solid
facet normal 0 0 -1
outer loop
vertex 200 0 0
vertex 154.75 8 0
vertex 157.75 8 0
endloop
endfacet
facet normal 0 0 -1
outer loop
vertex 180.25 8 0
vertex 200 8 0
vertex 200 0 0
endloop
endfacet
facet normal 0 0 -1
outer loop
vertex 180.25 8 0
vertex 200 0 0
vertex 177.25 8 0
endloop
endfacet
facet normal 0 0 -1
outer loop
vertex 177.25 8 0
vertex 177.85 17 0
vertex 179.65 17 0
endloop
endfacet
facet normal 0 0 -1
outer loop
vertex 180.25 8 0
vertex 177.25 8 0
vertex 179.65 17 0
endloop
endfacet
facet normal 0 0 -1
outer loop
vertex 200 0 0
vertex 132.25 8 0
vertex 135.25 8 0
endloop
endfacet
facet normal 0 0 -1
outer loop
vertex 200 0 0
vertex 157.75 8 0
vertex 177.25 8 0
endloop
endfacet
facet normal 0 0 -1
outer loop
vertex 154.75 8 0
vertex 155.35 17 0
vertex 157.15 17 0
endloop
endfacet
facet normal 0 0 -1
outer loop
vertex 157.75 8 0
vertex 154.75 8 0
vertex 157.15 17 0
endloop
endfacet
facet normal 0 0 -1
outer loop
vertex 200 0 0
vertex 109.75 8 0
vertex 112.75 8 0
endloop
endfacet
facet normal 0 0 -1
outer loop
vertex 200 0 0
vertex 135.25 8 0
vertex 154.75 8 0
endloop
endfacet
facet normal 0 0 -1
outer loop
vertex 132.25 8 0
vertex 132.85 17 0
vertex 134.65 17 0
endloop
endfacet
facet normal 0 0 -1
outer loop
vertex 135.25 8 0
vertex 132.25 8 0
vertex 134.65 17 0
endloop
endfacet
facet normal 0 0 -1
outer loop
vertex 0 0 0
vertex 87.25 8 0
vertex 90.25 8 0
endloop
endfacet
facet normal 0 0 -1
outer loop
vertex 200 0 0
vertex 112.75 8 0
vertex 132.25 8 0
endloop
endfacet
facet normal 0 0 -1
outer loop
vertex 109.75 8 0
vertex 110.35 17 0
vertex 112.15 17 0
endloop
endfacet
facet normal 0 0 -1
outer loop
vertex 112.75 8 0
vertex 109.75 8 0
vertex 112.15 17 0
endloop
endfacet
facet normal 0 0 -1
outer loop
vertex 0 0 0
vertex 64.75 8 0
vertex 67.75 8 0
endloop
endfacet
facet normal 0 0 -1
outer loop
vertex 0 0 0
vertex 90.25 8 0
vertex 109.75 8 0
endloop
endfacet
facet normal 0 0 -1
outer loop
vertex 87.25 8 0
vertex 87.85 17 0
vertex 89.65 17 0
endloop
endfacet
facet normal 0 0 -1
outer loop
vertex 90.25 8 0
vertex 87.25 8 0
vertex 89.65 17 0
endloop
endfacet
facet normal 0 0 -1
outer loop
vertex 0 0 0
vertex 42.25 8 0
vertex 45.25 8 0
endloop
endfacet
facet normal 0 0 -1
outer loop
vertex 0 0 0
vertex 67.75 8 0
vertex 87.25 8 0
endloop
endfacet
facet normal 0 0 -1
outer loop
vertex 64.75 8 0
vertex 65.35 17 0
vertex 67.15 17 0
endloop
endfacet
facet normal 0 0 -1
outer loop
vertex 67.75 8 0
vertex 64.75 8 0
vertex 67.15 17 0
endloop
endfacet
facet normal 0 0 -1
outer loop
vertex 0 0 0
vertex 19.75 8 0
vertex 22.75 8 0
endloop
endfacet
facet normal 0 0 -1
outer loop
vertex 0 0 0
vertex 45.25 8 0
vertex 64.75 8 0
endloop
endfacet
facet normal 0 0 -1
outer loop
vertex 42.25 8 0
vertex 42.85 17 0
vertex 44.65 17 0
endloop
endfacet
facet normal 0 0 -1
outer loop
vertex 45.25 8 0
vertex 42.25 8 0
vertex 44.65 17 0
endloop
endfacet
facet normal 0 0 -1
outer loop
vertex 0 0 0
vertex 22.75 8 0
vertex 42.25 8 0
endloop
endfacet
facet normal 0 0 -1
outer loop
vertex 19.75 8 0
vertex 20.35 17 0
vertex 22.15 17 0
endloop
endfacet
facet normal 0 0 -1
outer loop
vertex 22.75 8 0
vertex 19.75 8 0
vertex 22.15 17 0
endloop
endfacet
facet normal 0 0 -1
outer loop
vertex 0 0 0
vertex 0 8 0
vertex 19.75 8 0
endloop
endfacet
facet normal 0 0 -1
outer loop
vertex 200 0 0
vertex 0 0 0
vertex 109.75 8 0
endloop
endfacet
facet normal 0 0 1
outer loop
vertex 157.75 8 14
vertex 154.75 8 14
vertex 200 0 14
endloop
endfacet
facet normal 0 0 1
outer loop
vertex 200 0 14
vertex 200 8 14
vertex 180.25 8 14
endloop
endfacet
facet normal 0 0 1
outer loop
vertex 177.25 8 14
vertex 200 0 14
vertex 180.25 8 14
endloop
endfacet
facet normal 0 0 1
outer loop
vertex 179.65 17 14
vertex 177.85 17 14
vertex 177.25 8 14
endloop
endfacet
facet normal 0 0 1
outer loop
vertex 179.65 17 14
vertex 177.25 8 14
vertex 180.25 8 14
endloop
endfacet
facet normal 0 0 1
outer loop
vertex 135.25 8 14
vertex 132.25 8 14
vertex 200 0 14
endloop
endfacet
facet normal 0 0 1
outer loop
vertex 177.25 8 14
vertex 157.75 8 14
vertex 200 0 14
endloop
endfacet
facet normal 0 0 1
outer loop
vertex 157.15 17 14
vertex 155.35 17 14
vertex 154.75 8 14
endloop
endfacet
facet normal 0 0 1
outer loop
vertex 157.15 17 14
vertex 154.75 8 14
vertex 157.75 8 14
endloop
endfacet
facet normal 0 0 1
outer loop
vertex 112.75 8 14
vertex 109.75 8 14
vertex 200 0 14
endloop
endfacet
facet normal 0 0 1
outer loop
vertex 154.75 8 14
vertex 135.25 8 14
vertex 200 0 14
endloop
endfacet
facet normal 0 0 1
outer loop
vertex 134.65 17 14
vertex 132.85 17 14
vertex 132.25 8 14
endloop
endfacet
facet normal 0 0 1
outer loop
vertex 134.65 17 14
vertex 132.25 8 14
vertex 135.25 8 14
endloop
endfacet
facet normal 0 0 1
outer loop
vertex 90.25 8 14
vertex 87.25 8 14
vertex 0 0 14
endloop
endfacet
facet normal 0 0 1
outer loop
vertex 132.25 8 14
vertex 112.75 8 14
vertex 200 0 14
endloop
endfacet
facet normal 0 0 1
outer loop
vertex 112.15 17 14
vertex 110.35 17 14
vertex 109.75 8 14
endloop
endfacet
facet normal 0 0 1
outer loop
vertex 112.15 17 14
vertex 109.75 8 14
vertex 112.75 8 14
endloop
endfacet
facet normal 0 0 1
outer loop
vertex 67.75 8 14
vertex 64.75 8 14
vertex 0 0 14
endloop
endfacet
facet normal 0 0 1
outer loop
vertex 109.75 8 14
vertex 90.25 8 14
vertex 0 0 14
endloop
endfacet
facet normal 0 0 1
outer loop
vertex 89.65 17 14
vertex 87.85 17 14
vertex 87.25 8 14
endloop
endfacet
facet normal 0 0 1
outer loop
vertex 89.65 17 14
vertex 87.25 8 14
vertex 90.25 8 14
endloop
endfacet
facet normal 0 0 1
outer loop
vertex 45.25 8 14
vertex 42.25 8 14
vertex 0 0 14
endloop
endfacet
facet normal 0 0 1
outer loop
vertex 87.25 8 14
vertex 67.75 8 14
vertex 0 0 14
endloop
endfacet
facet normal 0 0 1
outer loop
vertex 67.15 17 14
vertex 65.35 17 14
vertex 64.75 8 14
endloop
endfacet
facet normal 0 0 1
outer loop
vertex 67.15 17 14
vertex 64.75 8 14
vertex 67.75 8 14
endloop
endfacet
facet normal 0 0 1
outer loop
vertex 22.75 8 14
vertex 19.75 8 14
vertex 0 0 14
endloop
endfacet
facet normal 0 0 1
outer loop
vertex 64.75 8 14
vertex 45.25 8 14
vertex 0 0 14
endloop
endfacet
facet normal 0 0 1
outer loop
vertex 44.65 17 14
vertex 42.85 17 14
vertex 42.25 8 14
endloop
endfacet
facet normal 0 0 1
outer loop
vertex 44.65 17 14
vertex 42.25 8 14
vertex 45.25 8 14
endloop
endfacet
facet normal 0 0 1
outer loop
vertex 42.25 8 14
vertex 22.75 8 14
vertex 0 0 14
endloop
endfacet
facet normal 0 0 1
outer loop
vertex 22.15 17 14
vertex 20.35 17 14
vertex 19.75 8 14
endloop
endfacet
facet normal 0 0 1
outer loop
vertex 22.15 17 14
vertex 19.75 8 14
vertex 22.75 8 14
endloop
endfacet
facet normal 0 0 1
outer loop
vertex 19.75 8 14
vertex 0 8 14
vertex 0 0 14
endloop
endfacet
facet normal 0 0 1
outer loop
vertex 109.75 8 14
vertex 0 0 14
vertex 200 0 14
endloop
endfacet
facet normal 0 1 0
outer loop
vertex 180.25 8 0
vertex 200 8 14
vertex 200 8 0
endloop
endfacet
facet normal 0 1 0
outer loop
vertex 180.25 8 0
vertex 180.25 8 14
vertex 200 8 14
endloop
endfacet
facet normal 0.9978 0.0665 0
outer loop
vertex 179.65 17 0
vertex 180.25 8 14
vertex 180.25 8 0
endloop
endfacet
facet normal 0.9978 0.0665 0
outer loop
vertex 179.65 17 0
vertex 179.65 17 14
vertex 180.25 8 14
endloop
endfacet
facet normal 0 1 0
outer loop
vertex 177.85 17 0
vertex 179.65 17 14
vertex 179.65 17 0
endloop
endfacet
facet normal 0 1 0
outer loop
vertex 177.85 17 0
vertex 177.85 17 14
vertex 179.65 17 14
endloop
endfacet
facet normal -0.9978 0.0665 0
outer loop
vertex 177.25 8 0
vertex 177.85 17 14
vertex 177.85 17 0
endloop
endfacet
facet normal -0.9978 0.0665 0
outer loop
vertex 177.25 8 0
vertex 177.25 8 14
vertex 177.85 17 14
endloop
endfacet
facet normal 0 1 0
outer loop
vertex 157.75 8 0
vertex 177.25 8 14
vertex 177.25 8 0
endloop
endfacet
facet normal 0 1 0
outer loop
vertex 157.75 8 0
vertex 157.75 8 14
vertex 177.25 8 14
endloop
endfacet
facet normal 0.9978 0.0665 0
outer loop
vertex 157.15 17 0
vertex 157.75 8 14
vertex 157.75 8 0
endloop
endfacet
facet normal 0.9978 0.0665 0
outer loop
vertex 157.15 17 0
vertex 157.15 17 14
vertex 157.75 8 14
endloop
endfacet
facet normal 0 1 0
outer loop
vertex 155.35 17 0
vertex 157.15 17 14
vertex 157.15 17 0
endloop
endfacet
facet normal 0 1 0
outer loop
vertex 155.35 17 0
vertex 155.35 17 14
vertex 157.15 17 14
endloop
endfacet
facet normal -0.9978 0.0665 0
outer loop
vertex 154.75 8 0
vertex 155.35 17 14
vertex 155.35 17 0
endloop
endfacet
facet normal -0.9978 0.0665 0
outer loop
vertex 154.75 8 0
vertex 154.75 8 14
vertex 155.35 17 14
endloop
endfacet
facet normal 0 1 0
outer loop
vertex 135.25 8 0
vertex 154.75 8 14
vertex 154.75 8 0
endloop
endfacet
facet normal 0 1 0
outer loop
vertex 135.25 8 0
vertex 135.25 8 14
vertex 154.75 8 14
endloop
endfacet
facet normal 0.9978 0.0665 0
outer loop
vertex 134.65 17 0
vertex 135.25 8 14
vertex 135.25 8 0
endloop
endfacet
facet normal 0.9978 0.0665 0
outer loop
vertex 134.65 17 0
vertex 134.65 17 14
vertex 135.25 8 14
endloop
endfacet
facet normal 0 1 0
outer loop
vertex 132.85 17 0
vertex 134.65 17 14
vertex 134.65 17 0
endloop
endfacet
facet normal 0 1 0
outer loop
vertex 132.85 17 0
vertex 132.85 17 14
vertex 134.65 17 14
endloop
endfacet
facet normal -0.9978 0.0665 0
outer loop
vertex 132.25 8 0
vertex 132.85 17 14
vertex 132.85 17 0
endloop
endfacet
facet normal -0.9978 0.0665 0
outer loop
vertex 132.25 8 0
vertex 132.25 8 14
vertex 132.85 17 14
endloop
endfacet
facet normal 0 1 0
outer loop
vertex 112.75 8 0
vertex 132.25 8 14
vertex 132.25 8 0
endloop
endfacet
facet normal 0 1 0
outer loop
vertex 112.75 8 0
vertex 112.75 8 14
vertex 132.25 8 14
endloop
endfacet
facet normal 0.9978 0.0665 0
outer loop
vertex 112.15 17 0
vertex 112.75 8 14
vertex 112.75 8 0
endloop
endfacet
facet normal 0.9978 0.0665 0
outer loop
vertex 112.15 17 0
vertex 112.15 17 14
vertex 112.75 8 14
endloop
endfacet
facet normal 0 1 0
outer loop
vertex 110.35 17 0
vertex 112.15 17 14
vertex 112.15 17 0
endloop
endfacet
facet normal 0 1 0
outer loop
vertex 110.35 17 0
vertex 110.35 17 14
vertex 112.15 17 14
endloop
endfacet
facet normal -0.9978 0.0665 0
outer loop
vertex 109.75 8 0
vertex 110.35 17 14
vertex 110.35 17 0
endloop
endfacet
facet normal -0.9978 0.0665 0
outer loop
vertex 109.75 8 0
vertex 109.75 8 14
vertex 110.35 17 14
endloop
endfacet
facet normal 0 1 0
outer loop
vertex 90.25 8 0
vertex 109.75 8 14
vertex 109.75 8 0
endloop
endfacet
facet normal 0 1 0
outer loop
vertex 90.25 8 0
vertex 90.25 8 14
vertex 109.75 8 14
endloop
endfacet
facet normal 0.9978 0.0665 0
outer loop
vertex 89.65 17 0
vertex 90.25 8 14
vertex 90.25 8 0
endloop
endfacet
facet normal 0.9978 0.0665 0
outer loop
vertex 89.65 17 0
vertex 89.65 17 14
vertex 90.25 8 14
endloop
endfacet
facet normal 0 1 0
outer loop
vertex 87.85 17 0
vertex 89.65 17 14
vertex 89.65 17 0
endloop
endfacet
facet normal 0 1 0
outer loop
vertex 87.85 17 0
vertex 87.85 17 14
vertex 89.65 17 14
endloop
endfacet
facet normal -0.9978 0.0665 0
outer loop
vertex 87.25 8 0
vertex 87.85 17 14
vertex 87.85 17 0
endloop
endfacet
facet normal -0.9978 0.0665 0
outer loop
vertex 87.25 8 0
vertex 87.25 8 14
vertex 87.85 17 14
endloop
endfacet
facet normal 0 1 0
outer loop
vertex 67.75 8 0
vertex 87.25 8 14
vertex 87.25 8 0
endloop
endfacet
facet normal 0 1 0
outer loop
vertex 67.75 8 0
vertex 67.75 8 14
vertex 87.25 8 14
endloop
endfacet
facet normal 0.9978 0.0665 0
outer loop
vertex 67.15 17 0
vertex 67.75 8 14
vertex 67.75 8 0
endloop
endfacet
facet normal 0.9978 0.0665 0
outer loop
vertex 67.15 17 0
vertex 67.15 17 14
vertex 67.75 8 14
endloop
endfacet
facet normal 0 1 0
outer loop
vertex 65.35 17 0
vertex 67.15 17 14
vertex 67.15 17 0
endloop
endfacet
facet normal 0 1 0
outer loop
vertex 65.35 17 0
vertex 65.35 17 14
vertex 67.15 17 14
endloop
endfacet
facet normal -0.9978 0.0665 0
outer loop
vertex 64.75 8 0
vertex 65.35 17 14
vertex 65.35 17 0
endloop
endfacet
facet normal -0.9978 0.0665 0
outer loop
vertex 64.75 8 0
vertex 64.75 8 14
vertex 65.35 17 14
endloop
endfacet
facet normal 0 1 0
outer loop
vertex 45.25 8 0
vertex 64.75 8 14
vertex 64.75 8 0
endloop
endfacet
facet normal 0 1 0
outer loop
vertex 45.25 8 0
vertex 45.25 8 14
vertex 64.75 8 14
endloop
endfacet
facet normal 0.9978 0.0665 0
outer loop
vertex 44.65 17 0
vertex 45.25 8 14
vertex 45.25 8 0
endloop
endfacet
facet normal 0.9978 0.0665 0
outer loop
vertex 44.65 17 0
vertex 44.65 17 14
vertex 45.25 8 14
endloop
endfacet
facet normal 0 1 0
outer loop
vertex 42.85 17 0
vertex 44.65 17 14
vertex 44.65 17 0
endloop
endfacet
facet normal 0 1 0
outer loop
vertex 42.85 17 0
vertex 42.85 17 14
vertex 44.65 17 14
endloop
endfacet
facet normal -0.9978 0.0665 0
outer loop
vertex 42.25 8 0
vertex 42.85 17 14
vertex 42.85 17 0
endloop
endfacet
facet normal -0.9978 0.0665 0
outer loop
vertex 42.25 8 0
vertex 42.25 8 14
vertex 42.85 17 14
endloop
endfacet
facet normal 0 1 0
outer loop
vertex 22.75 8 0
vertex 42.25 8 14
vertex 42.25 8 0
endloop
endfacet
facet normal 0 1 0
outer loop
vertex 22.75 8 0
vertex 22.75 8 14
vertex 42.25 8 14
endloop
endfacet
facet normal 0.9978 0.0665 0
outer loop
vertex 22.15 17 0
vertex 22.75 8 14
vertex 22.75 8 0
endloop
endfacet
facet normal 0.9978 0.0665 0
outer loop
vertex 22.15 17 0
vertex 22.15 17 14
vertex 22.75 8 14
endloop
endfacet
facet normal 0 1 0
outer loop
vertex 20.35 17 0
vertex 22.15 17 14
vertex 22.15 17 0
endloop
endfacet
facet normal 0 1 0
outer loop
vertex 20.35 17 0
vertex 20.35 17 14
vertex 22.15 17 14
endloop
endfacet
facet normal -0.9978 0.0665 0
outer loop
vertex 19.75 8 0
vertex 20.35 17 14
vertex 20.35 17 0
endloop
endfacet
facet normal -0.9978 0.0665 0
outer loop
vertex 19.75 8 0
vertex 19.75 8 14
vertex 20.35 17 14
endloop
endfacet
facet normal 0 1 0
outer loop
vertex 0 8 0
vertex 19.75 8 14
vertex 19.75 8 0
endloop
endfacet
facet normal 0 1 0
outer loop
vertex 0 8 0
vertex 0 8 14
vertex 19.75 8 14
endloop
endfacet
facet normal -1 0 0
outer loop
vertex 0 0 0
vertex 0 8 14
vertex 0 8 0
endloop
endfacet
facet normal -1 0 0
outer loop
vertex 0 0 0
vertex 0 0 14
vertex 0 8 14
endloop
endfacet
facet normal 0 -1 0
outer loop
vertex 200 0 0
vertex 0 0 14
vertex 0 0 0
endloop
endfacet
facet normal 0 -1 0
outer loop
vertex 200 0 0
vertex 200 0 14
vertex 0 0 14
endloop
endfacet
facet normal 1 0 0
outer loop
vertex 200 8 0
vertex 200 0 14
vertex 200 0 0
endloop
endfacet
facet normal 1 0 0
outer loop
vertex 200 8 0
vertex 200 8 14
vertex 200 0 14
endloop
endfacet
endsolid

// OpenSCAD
$fn = 32;

// ----------------------------------------------------------------------
// Gear rack: 8 teeth on a 200 mm bar, pitch 22.5 mm
// ----------------------------------------------------------------------

// --- parameters (mm) ---
profile_height = 14;      // extrusion height
profile_points = 36;      // points of the closed outline

profile = [[0, 0], [200, 0], [200, 8], [180.25, 8], [179.65, 17], [177.85, 17], [177.25, 8], [157.75, 8], [157.15, 17], [155.35, 17], [154.75, 8], [135.25, 8], [134.65, 17], [132.85, 17], [132.25, 8], [112.75, 8], [112.15, 17], [110.35, 17], [109.75, 8], [90.25, 8], [89.65, 17], [87.85, 17], [87.25, 8], [67.75, 8], [67.15, 17], [65.35, 17], [64.75, 8], [45.25, 8], [44.65, 17], [42.85, 17], [42.25, 8], [22.75, 8], [22.15, 17], [20.35, 17], [19.75, 8], [0, 8]];  // single closed polygon, 36 points, counter clockwise

// --- the one profile operation ---
linear_extrude(height = profile_height) polygon(points = profile);
